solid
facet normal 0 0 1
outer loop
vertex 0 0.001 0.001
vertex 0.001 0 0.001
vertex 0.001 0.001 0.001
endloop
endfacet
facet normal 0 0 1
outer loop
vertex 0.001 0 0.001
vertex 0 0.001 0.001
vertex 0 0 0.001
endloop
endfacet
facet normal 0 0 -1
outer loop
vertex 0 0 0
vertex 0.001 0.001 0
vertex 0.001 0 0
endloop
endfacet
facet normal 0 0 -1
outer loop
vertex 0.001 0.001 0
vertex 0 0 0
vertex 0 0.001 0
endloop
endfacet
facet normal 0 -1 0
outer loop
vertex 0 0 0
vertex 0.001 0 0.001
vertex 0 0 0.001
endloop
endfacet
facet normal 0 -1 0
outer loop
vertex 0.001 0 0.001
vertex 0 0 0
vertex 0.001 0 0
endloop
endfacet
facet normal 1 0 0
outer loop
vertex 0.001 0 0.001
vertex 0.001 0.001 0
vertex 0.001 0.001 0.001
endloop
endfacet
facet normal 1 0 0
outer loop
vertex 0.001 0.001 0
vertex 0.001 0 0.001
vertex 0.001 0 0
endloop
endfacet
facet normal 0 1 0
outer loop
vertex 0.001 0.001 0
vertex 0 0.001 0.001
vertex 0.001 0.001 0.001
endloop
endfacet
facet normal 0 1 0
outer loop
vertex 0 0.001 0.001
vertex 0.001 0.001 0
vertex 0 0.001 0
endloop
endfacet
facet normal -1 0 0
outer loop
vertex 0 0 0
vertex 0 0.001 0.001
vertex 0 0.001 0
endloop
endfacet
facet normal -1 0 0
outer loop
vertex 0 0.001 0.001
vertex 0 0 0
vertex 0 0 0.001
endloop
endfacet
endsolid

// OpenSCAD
// t_path — the spine IR and the frame compiler. Pure data: nothing renders.
// This whole file is only possible because the IR is data (docs/developer/verification.md).

use <../src/uniTube.scad>;

// ============================================ the worked 90-degree elbow (docs/reference/ir.md)
c = [35, 15, 0];
u = [0, -1, 0];
v = [1, 0, 0];
elbow =
ut_spine([ut_line([0, 0, 0], [35, 0, 0]), ut_arc(c, u, v, 15, 90), ut_line([50, 15, 0], [50, 50, 0])]);

// The arc's endpoints and tangents, verifiable by hand with no rendering:
segA = ut_segs(elbow)[1];
assert(norm(ut_seg_p0(segA) - [35, 0, 0]) < 1e-9, "arc start = c + r*u");
assert(norm(ut_seg_p1(segA) - [50, 15, 0]) < 1e-9, "arc end = c + r*v at 90 deg");
assert(norm(ut_seg_t0(segA) - [1, 0, 0]) < 1e-9, "arc start tangent = v");
assert(norm(ut_seg_t1(segA) - [0, 1, 0]) < 1e-9, "arc end tangent = -u at 90 deg");

// EXIT CRITERION: exact developed length, no tessellation.
assert(
    abs(ut_length(elbow) - 93.5619449019) < 1e-9,
    str("exact developed length must be 93.5619449019, got ", ut_length(elbow))
);

// ============================================ SPINE invariants must abort
// (Each of these is verified by the negative tests in `just check` rather than
// here, since an assert that fires cannot be caught inside OpenSCAD.)

// ============================================ stations
sts = ut_stations(elbow, [["frame", "transport"]]);
N = len(sts);
assert(N >= 4, str("expected several stations, got ", N));

// STATION-1 — no two consecutive positions coincide (the dedupe that kills the
// coincident-point NaN in path_extrude.scad:58).
assert(
    min([for (i = [0:N - 2]) norm(ut_st_p(sts[i + 1]) - ut_st_p(sts[i]))]) > 1e-9,
    "STATION-1: duplicate consecutive stations"
);

// STATION-2 — orthonormal frames, no scale, no shear.
assert(max([for (s = sts) abs(norm(ut_st_t(s)) - 1)]) < 1e-9, "STATION-2: |t| = 1");
assert(max([for (s = sts) abs(norm(ut_st_n(s)) - 1)]) < 1e-9, "STATION-2: |n| = 1");
assert(max([for (s = sts) abs(ut_st_t(s) * ut_st_n(s))]) < 1e-9, "STATION-2: n must be orthogonal to t");

// STATION-3 — EXACT terminal tangents, not smoothed finite differences.
// This is what a threaded adapter is clocked against; inference measured 1.18 deg
// of skew here, which is ~0.4 mm of gap across a 20 mm flange.
assert(norm(ut_st_t(sts[0]) - [1, 0, 0]) < 1e-12, "STATION-3: first tangent must be EXACTLY [1,0,0]");
assert(norm(ut_st_t(sts[N - 1]) - [0, 1, 0]) < 1e-12, "STATION-3: last tangent must be EXACTLY [0,1,0]");

// STATION-4 — arclength starts at 0, strictly increases, ends at ut_length().
assert(abs(ut_st_s(sts[0])) < 1e-12, "STATION-4: s[0] = 0");
assert(min([for (i = [0:N - 2]) ut_st_s(sts[i + 1]) - ut_st_s(sts[i])]) > 0, "STATION-4: s strictly increasing");
assert(abs(ut_st_s(sts[N - 1]) - ut_length(elbow)) < 1e-6, "STATION-4: s[last] = exact developed length");

// STATION-5 — bounded turn between consecutive tangents.
assert(max([for (i = [0:N - 2]) ut_turn(ut_st_t(sts[i]), ut_st_t(sts[i + 1]))]) < 45, "STATION-5: bounded turn");

// EXIT CRITERION: a PLANAR bend produces EXACTLY zero twist.
// The roll reference [0,0,1] is parallel to the bend axis [0,0,1], and Rodrigues
// leaves a vector parallel to its axis invariant. docs/developer/history.md §2.
assert(
    max([for (s = sts) norm(ut_st_n(s) - [0, 0, 1])]) < 1e-12,
    "a planar bend must produce exactly zero twist -- every normal stays [0,0,1]"
);

// ============================================ the frame matrix
m = ut_st_mat(sts[N - 1]);
assert(abs(m[0][3] - 50) < 1e-9 && abs(m[1][3] - 50) < 1e-9, "ut_st_mat: translation column is the position");
det = m[0][0] * (m[1][1] * m[2][2] - m[1][2] * m[2][1]) - m[0][1] * (m[1][0] * m[2][2] - m[1][2] * m[2][0]) + m[0][2] * (m[1][0] * m[2][1] - m[1][1] * m[2][0]);
assert(abs(det - 1) < 1e-9, str("ut_st_mat: rotation must be right-handed with det +1, got ", det));

// ============================================ a NON-planar path really does twist
// Two bends in different planes: the frame must carry roll through, and must not
// spiral. This is the case half_curvedPipe.scad existed to solve.
sp2 = ut_spine(
    [
        ut_line([0, 0, 0], [30, 0, 0]), // +X
        ut_arc_from([30, 20, 0], [30, 0, 0], [50, 20, 0], [0, 0, 1]), // bend in XY: +X -> +Y
        ut_line([50, 20, 0], [50, 50, 0]), // +Y
        ut_arc_from([50, 50, 20], [50, 50, 0], [50, 70, 20], [1, 0, 0]), // bend in YZ: +Y -> +Z
        ut_line([50, 70, 20], [50, 70, 60]), // +Z, vertical: the UP-seed degeneracy
    ]
);
s2 = ut_stations(sp2);
assert(max([for (s = s2) abs(ut_st_t(s) * ut_st_n(s))]) < 1e-9, "non-planar: frames stay orthonormal");
assert(abs(ut_st_s(s2[len(s2) - 1]) - ut_length(sp2)) < 1e-6, "non-planar: arclength closes");
// The final leg runs straight up (+Z), where the UP seed is degenerate. The
// fallback must keep every normal finite -- this is the NaN that killed the
// previous attempt's own flagship example.
nlast = ut_st_n(s2[len(s2) - 1]);
assert(is_num(nlast[0]) && is_num(nlast[1]) && is_num(nlast[2]), "vertical final leg must not produce NaN normals");

// ============================================ explicit twist distributes by arclength
tw = ut_stations(elbow, [["twist", 90]]);
assert(abs(_t_roll(ut_st_n(tw[0]), [0, 0, 1])) < 1e-9, "twist: zero at the start");
function _t_roll(a, b) = ut_turn(a, b);
assert(abs(_t_roll(ut_st_n(tw[len(tw) - 1]), [0, 0, 1]) - 90) < 1e-6, "twist: full 90 deg by the end");

// ============================================ closed paths
// The machinery existed from Phase 1 and was unreachable; this is the coverage
// it never had. Reachable through ut_spine only -- ut_polyline refuses closed
// explicitly, and ut_turtle / ut_curve have no such parameter.
CR = 60;
loop = ut_spine(
    [
        ut_arc([0, 0, 0], [1, 0, 0], [0, 1, 0], CR, 90),
        ut_arc([0, 0, 0], [0, 1, 0], [-1, 0, 0], CR, 90),
        ut_arc([0, 0, 0], [-1, 0, 0], [0, -1, 0], CR, 90),
        ut_arc([0, 0, 0], [0, -1, 0], [1, 0, 0], CR, 90),
    ],
    closed=true
);

assert(ut_closed(loop), "the spine records that it is closed");
assert(abs(ut_length(loop) - 2 * PI * CR) < 1e-9, "exact circumference, no tessellation");

csts = ut_stations(loop);
CN = len(csts);

// STATION-7 — NO duplicated terminal station. The last raw sample coincides with
// the first by construction; it must survive long enough to measure the loop
// holonomy but must not reach the backend, or the wrap ring stitches a station
// to itself. Measured before the fix: 88 degenerate triangles out of 2904.
assert(
    norm(ut_st_p(csts[CN - 1]) - ut_st_p(csts[0])) > 1,
    "STATION-7: a closed station list must not duplicate its terminal station"
);
assert(min([for (i = [0:CN - 2]) norm(ut_st_p(csts[i + 1]) - ut_st_p(csts[i]))]) > 1e-9, "STATION-1 holds too");

// And the emitted mesh has no degenerate faces.
crgn = ut_solid_rgn(ut_round(od=14, wall=2));
cpts = ut_mesh_points(crgn, csts, true);
cfcs = ut_mesh_faces(crgn, csts, true);
assert(
    len([for (f = cfcs) if (norm(cross(cpts[f[1]] - cpts[f[0]], cpts[f[2]] - cpts[f[0]])) / 2 < 1e-9) 1]) == 0,
    "a closed sweep must emit no degenerate triangles"
);

// The loop holonomy is measured, absorbed and distributed, so the seam meets
// itself: consecutive normals stay one step apart all the way round, including
// across the wrap from the last station back to the first.
assert(
    ut_turn(ut_st_n(csts[CN - 1]), ut_st_n(csts[0])) < 1e-6,
    str("closed-loop holonomy residual must vanish, got ", ut_turn(ut_st_n(csts[CN - 1]), ut_st_n(csts[0])))
);
assert(max([for (s = csts) abs(ut_st_t(s) * ut_st_n(s))]) < 1e-9, "frames stay orthonormal all the way round");

// ================================================================ ut_at
// ut_at() had NO test at all, which is why the bug below survived: it reads
// position and tangent EXACTLY from the spine, and the tangent was wrong on
// every P segment.

// L and A segments are exact by construction.
apath = ut_polyline([[0, 0, 0], [60, 0, 0], [60, 60, 0]], r=20);
assert(norm(ut_at(apath, 10)[0] - [10, 0, 0]) < 1e-9, "ut_at: position on a straight");
assert(ut_turn(ut_at(apath, 10)[1], [1, 0, 0]) < 1e-9, "ut_at: tangent on a straight");
assert(
    ut_turn(ut_at(apath, ut_length(apath) / 2)[1], ut_unit([1, 1, 0])) < 1e-9,
    "ut_at: the midpoint of a symmetric elbow bisects the turn exactly"
);
assert(ut_turn(ut_at(apath, ut_length(apath))[1], [0, 1, 0]) < 1e-9, "ut_at: the far end tangent");

// A P segment. The tangent is interpolated along the chord, so at a SAMPLE it is
// exactly the stored tangent. It used to be t[i+1] for every s, so ut_at(p, 0)
// returned the tangent one sample downstream -- measured 8.94 degrees out at the
// start of this very helix, one full sample's rotation, on a public function
// documented to return the tangent at s.
hf = function(t) [40 * cos(360 * t), 40 * sin(360 * t), 30 * t];
hd = function(t) [-2 * PI * 40 * sin(360 * t), 2 * PI * 40 * cos(360 * t), 30];
hp = ut_curve(hf, n=40, dfdt=hd);
HL = ut_length(hp);
assert(
    ut_turn(ut_at(hp, 0)[1], ut_unit(hd(0))) < 1e-9,
    str("ut_at: the tangent at s=0 is the tangent AT s=0, got ", ut_turn(ut_at(hp, 0)[1], ut_unit(hd(0))), " deg")
);
assert(ut_turn(ut_at(hp, HL)[1], ut_unit(hd(1))) < 1e-9, "ut_at: and at the far end");
// Between samples it stays second order -- 0.021 deg worst case at n=40.
assert(
    max([for (fr = [0.012, 0.137, 0.5, 0.863, 0.988]) ut_turn(ut_at(hp, HL * fr)[1], ut_unit(hd(fr)))]) < 0.05,
    "ut_at: interpolated tangents stay within 0.05 deg between samples"
);
// Position still walks the chain correctly.
assert(norm(ut_at(hp, 0)[0] - hf(0)) < 1e-9, "ut_at: position at s=0");

cube(0.001); // sentinel
